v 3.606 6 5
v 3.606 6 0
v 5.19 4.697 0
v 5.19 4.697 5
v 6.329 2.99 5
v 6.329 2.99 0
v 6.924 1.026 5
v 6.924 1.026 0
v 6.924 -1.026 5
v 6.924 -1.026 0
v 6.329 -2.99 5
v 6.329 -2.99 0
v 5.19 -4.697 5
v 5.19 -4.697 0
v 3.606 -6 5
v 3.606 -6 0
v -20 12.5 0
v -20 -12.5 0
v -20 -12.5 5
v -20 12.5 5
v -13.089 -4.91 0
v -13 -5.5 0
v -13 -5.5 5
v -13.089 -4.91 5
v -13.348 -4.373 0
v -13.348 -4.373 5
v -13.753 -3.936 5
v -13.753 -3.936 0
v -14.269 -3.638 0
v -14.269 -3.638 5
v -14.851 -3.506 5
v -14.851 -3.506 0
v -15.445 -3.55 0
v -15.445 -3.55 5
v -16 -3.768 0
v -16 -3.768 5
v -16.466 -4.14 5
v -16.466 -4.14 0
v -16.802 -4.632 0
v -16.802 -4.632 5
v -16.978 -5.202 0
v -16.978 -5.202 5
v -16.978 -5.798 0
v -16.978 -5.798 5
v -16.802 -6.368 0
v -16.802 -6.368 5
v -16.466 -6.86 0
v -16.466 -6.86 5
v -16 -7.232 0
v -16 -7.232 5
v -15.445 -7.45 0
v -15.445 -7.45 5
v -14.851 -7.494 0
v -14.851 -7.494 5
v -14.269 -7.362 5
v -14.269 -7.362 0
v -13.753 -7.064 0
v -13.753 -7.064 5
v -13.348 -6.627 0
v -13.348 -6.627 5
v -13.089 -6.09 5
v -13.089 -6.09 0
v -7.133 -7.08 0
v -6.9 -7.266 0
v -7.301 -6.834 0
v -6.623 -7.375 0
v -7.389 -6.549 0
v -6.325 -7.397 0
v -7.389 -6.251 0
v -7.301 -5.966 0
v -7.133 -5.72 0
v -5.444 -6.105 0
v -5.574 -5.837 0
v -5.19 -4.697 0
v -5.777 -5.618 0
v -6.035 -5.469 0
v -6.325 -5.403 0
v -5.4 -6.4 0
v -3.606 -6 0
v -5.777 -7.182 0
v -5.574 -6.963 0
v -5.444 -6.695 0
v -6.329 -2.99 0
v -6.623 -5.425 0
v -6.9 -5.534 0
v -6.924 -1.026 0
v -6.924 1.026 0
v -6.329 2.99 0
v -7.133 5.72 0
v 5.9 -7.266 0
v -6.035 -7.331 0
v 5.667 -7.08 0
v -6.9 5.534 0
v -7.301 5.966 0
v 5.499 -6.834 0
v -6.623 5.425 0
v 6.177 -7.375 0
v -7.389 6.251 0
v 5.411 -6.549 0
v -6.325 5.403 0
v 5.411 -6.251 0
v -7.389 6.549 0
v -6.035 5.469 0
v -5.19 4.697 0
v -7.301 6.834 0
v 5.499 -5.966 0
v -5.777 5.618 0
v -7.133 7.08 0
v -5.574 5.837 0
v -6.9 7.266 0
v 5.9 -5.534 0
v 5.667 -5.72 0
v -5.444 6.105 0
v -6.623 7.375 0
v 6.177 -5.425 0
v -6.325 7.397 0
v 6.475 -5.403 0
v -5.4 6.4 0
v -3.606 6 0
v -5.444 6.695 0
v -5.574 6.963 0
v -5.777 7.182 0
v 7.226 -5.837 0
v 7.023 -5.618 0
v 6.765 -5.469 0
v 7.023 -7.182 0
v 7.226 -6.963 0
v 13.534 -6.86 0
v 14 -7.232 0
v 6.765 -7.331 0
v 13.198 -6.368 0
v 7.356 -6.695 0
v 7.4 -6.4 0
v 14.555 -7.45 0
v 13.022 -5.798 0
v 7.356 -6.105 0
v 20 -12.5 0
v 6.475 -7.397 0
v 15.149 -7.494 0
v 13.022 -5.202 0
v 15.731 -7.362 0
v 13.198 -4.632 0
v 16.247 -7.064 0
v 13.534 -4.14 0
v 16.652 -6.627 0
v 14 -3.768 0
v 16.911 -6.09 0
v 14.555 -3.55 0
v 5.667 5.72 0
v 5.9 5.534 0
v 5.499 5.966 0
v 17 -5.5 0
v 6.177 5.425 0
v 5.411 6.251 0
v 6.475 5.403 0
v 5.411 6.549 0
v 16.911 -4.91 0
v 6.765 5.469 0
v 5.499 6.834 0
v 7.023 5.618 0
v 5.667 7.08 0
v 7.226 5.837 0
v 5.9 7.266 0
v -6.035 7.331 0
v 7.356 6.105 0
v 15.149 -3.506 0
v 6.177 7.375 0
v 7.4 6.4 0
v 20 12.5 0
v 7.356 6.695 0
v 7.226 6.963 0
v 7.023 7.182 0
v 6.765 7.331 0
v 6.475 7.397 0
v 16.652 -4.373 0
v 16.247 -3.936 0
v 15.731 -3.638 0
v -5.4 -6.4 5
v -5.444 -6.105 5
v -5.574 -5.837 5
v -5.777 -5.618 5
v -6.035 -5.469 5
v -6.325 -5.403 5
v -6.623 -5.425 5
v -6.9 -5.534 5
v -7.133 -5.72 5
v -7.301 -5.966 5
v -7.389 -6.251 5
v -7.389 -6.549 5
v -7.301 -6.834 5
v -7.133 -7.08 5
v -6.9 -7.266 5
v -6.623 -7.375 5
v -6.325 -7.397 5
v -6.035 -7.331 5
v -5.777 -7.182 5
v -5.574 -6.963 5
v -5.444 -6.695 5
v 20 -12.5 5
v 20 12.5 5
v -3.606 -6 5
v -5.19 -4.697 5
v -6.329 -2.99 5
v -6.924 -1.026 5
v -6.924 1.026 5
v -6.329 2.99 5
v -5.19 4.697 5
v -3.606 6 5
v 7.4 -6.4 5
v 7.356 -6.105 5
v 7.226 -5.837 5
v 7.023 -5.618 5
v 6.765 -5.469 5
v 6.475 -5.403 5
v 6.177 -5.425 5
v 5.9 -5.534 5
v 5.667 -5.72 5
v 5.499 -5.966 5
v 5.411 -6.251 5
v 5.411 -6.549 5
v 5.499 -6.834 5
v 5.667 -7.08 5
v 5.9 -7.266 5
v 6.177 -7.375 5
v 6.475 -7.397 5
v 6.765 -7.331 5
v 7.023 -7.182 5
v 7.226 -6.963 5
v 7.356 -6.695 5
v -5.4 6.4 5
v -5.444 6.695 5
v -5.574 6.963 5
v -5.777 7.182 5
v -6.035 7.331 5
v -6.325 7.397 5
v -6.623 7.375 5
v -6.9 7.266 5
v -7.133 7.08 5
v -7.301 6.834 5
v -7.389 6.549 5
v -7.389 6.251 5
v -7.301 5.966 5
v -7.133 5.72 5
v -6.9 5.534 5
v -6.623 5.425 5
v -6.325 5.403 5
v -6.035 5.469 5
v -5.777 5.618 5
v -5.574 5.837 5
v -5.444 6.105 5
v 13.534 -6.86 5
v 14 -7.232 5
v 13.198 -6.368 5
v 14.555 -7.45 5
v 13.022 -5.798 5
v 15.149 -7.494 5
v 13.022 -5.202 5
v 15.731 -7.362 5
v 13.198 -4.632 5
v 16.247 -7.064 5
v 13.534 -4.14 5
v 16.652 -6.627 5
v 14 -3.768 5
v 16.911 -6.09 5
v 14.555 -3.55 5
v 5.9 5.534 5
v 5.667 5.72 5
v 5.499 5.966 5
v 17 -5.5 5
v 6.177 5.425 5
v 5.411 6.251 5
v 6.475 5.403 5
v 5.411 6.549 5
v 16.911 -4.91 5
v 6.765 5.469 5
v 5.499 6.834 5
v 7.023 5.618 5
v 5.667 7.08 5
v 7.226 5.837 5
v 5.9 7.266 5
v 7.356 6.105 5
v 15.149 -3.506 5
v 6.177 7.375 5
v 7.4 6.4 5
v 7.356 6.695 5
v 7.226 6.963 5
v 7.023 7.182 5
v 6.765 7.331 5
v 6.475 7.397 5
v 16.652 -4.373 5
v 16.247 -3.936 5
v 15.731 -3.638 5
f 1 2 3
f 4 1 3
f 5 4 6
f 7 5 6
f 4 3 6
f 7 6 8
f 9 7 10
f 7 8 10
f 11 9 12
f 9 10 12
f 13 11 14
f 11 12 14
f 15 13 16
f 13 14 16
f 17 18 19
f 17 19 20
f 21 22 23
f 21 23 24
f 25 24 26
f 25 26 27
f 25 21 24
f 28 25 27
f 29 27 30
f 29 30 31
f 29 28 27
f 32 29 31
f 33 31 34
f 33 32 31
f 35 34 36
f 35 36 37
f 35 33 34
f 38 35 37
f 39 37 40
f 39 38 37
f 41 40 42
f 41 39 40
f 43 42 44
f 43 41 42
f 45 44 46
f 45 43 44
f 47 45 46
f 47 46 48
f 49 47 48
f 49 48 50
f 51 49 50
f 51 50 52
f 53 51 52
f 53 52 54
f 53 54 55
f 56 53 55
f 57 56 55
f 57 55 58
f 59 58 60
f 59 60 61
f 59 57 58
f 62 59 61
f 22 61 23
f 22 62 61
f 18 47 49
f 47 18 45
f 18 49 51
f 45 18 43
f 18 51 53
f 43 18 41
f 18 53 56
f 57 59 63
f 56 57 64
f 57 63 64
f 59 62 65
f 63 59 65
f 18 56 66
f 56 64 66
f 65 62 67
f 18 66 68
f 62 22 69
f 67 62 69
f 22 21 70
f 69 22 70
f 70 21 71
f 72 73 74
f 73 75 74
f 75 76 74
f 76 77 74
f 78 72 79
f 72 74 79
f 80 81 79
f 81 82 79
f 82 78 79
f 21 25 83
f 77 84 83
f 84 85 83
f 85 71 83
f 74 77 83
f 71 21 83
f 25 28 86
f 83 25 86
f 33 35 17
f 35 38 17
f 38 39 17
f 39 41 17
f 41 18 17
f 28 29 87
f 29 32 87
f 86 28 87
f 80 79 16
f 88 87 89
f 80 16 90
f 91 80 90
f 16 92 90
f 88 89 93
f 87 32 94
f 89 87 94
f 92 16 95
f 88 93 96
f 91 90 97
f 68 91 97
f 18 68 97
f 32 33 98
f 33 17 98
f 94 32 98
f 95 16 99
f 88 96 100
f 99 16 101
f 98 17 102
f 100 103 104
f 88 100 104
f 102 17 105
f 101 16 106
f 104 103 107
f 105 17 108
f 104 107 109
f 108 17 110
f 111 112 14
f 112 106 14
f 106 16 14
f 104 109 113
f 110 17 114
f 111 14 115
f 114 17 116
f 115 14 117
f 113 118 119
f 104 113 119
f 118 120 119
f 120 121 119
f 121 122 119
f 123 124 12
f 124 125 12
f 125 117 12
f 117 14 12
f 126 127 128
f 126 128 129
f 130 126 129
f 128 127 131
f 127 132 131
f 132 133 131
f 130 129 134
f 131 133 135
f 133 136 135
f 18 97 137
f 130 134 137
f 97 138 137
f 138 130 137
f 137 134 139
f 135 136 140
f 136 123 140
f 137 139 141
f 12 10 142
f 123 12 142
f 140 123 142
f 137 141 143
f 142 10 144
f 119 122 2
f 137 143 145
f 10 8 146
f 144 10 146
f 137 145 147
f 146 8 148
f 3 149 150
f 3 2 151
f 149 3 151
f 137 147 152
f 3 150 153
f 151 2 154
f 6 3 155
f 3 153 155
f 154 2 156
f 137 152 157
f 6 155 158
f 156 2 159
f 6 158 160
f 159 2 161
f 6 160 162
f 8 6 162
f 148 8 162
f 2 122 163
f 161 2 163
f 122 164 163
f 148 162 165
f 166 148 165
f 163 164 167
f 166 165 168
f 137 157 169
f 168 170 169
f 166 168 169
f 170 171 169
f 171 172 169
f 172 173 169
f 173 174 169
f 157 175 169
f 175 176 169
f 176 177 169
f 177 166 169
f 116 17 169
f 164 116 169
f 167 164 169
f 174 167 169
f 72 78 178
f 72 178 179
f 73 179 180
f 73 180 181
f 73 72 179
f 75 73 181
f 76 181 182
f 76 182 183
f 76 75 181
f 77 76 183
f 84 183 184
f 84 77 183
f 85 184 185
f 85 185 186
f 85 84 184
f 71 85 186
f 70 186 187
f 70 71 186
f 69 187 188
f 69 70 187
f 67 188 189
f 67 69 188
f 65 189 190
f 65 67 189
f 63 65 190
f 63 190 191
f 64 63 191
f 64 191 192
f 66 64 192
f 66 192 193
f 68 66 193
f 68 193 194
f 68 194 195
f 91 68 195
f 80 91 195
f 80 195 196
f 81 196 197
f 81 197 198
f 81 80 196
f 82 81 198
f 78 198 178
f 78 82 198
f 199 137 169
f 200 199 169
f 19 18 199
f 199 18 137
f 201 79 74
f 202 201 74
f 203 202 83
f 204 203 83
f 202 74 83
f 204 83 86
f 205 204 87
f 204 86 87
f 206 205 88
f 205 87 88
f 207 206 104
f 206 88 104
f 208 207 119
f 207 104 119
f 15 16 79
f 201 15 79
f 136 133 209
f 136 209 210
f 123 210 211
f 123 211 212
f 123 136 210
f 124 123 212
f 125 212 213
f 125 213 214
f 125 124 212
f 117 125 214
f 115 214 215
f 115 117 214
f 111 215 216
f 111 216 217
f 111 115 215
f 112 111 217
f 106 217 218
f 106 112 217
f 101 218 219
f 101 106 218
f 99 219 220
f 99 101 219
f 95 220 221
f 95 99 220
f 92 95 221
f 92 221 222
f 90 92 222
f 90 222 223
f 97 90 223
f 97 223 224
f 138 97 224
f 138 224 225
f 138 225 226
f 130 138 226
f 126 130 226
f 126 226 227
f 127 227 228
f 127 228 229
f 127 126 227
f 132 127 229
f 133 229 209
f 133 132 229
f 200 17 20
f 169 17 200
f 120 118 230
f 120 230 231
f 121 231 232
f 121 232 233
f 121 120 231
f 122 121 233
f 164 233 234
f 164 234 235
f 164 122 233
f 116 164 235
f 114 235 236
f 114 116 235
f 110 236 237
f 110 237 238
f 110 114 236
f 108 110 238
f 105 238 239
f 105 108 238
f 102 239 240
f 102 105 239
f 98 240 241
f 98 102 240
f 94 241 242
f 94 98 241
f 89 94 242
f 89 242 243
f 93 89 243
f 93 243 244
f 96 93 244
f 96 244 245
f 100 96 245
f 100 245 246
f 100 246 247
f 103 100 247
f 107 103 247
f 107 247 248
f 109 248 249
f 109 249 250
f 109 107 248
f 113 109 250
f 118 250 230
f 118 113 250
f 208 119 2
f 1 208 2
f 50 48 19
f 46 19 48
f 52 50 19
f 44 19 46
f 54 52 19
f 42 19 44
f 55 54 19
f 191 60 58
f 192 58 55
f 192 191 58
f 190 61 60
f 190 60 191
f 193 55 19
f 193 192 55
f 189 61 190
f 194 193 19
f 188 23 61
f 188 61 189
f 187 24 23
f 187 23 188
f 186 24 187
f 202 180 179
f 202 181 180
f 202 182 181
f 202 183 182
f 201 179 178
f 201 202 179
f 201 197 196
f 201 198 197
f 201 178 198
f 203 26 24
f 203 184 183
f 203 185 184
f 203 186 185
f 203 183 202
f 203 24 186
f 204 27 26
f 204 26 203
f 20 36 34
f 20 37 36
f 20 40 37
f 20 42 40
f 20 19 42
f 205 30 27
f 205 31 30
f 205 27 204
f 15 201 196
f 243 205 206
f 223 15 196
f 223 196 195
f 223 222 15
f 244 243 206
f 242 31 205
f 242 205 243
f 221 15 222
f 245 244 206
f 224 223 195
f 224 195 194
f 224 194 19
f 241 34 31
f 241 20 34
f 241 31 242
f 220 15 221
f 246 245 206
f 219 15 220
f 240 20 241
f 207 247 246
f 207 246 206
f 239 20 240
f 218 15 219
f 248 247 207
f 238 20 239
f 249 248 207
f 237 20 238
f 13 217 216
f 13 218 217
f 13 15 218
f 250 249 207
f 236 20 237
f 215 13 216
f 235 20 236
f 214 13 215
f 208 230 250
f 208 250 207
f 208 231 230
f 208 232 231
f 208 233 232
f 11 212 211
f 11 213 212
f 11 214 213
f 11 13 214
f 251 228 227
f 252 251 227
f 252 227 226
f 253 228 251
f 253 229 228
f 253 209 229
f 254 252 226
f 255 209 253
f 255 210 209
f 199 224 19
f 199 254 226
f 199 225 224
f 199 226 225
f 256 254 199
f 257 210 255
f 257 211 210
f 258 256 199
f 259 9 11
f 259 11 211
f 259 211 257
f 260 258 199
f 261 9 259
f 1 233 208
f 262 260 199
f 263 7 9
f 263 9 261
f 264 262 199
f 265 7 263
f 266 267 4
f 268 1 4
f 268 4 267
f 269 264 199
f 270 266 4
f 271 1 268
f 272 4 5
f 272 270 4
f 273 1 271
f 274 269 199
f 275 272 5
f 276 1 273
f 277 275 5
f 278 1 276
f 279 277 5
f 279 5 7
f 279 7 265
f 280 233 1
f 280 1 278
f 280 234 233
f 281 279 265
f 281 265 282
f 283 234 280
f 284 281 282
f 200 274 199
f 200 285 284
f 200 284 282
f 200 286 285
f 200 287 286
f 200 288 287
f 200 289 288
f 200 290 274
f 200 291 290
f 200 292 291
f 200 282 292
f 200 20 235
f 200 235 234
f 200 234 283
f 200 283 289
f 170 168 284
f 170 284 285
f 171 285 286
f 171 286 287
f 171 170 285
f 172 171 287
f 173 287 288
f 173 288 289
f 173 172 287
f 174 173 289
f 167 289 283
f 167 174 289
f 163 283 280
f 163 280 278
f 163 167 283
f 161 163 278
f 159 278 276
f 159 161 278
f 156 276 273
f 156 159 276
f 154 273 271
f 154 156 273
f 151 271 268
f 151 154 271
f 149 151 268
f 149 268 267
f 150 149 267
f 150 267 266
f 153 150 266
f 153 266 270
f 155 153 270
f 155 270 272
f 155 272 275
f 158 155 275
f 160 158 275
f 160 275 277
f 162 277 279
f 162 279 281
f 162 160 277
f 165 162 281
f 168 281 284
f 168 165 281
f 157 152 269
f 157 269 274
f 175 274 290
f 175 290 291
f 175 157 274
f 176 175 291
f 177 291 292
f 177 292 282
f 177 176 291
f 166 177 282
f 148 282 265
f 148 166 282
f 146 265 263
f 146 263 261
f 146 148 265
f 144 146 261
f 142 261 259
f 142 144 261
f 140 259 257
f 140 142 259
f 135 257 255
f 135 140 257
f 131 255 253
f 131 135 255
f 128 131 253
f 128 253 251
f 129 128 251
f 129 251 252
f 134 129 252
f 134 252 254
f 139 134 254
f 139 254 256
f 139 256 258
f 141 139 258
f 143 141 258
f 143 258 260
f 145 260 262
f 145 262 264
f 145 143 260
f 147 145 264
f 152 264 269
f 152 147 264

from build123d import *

# Parameters (mm, degrees)
SKETCH1_W           = 40
SKETCH1_H           = 25
SKETCH1_R           = 2
SKETCH1_R_2         = 1
BOSS_EXTRUDE1_DEPTH = 5


with BuildPart() as part:
    # Sketch1 → Boss-Extrude1 (new body)
    with BuildSketch(Plane.XY):
        Rectangle(SKETCH1_W, SKETCH1_H)
        with Locations((15, -5.5)):
            Circle(SKETCH1_R, mode=Mode.SUBTRACT)
        with Locations((-6.4, 6.4)):
            Circle(SKETCH1_R_2, mode=Mode.SUBTRACT)
        with Locations((-15, -5.5)):
            Circle(SKETCH1_R, mode=Mode.SUBTRACT)
        with Locations((6.4, 6.4)):
            Circle(SKETCH1_R_2, mode=Mode.SUBTRACT)
        with Locations((6.4, -6.4)):
            Circle(SKETCH1_R_2, mode=Mode.SUBTRACT)
        with Locations((-6.4, -6.4)):
            Circle(SKETCH1_R_2, mode=Mode.SUBTRACT)
        with BuildLine():
            Line((-3.605551275, 6), (3.605551275, 6))
            ThreePointArc((3.605551275, 6), (7, 0), (3.605551275, -6))
            Line((3.605551275, -6), (-3.605551275, -6))
            ThreePointArc((-3.605551275, -6), (-7, 0), (-3.605551275, 6))
        make_face(mode=Mode.SUBTRACT)
    extrude(amount=BOSS_EXTRUDE1_DEPTH)


solid = part.part
